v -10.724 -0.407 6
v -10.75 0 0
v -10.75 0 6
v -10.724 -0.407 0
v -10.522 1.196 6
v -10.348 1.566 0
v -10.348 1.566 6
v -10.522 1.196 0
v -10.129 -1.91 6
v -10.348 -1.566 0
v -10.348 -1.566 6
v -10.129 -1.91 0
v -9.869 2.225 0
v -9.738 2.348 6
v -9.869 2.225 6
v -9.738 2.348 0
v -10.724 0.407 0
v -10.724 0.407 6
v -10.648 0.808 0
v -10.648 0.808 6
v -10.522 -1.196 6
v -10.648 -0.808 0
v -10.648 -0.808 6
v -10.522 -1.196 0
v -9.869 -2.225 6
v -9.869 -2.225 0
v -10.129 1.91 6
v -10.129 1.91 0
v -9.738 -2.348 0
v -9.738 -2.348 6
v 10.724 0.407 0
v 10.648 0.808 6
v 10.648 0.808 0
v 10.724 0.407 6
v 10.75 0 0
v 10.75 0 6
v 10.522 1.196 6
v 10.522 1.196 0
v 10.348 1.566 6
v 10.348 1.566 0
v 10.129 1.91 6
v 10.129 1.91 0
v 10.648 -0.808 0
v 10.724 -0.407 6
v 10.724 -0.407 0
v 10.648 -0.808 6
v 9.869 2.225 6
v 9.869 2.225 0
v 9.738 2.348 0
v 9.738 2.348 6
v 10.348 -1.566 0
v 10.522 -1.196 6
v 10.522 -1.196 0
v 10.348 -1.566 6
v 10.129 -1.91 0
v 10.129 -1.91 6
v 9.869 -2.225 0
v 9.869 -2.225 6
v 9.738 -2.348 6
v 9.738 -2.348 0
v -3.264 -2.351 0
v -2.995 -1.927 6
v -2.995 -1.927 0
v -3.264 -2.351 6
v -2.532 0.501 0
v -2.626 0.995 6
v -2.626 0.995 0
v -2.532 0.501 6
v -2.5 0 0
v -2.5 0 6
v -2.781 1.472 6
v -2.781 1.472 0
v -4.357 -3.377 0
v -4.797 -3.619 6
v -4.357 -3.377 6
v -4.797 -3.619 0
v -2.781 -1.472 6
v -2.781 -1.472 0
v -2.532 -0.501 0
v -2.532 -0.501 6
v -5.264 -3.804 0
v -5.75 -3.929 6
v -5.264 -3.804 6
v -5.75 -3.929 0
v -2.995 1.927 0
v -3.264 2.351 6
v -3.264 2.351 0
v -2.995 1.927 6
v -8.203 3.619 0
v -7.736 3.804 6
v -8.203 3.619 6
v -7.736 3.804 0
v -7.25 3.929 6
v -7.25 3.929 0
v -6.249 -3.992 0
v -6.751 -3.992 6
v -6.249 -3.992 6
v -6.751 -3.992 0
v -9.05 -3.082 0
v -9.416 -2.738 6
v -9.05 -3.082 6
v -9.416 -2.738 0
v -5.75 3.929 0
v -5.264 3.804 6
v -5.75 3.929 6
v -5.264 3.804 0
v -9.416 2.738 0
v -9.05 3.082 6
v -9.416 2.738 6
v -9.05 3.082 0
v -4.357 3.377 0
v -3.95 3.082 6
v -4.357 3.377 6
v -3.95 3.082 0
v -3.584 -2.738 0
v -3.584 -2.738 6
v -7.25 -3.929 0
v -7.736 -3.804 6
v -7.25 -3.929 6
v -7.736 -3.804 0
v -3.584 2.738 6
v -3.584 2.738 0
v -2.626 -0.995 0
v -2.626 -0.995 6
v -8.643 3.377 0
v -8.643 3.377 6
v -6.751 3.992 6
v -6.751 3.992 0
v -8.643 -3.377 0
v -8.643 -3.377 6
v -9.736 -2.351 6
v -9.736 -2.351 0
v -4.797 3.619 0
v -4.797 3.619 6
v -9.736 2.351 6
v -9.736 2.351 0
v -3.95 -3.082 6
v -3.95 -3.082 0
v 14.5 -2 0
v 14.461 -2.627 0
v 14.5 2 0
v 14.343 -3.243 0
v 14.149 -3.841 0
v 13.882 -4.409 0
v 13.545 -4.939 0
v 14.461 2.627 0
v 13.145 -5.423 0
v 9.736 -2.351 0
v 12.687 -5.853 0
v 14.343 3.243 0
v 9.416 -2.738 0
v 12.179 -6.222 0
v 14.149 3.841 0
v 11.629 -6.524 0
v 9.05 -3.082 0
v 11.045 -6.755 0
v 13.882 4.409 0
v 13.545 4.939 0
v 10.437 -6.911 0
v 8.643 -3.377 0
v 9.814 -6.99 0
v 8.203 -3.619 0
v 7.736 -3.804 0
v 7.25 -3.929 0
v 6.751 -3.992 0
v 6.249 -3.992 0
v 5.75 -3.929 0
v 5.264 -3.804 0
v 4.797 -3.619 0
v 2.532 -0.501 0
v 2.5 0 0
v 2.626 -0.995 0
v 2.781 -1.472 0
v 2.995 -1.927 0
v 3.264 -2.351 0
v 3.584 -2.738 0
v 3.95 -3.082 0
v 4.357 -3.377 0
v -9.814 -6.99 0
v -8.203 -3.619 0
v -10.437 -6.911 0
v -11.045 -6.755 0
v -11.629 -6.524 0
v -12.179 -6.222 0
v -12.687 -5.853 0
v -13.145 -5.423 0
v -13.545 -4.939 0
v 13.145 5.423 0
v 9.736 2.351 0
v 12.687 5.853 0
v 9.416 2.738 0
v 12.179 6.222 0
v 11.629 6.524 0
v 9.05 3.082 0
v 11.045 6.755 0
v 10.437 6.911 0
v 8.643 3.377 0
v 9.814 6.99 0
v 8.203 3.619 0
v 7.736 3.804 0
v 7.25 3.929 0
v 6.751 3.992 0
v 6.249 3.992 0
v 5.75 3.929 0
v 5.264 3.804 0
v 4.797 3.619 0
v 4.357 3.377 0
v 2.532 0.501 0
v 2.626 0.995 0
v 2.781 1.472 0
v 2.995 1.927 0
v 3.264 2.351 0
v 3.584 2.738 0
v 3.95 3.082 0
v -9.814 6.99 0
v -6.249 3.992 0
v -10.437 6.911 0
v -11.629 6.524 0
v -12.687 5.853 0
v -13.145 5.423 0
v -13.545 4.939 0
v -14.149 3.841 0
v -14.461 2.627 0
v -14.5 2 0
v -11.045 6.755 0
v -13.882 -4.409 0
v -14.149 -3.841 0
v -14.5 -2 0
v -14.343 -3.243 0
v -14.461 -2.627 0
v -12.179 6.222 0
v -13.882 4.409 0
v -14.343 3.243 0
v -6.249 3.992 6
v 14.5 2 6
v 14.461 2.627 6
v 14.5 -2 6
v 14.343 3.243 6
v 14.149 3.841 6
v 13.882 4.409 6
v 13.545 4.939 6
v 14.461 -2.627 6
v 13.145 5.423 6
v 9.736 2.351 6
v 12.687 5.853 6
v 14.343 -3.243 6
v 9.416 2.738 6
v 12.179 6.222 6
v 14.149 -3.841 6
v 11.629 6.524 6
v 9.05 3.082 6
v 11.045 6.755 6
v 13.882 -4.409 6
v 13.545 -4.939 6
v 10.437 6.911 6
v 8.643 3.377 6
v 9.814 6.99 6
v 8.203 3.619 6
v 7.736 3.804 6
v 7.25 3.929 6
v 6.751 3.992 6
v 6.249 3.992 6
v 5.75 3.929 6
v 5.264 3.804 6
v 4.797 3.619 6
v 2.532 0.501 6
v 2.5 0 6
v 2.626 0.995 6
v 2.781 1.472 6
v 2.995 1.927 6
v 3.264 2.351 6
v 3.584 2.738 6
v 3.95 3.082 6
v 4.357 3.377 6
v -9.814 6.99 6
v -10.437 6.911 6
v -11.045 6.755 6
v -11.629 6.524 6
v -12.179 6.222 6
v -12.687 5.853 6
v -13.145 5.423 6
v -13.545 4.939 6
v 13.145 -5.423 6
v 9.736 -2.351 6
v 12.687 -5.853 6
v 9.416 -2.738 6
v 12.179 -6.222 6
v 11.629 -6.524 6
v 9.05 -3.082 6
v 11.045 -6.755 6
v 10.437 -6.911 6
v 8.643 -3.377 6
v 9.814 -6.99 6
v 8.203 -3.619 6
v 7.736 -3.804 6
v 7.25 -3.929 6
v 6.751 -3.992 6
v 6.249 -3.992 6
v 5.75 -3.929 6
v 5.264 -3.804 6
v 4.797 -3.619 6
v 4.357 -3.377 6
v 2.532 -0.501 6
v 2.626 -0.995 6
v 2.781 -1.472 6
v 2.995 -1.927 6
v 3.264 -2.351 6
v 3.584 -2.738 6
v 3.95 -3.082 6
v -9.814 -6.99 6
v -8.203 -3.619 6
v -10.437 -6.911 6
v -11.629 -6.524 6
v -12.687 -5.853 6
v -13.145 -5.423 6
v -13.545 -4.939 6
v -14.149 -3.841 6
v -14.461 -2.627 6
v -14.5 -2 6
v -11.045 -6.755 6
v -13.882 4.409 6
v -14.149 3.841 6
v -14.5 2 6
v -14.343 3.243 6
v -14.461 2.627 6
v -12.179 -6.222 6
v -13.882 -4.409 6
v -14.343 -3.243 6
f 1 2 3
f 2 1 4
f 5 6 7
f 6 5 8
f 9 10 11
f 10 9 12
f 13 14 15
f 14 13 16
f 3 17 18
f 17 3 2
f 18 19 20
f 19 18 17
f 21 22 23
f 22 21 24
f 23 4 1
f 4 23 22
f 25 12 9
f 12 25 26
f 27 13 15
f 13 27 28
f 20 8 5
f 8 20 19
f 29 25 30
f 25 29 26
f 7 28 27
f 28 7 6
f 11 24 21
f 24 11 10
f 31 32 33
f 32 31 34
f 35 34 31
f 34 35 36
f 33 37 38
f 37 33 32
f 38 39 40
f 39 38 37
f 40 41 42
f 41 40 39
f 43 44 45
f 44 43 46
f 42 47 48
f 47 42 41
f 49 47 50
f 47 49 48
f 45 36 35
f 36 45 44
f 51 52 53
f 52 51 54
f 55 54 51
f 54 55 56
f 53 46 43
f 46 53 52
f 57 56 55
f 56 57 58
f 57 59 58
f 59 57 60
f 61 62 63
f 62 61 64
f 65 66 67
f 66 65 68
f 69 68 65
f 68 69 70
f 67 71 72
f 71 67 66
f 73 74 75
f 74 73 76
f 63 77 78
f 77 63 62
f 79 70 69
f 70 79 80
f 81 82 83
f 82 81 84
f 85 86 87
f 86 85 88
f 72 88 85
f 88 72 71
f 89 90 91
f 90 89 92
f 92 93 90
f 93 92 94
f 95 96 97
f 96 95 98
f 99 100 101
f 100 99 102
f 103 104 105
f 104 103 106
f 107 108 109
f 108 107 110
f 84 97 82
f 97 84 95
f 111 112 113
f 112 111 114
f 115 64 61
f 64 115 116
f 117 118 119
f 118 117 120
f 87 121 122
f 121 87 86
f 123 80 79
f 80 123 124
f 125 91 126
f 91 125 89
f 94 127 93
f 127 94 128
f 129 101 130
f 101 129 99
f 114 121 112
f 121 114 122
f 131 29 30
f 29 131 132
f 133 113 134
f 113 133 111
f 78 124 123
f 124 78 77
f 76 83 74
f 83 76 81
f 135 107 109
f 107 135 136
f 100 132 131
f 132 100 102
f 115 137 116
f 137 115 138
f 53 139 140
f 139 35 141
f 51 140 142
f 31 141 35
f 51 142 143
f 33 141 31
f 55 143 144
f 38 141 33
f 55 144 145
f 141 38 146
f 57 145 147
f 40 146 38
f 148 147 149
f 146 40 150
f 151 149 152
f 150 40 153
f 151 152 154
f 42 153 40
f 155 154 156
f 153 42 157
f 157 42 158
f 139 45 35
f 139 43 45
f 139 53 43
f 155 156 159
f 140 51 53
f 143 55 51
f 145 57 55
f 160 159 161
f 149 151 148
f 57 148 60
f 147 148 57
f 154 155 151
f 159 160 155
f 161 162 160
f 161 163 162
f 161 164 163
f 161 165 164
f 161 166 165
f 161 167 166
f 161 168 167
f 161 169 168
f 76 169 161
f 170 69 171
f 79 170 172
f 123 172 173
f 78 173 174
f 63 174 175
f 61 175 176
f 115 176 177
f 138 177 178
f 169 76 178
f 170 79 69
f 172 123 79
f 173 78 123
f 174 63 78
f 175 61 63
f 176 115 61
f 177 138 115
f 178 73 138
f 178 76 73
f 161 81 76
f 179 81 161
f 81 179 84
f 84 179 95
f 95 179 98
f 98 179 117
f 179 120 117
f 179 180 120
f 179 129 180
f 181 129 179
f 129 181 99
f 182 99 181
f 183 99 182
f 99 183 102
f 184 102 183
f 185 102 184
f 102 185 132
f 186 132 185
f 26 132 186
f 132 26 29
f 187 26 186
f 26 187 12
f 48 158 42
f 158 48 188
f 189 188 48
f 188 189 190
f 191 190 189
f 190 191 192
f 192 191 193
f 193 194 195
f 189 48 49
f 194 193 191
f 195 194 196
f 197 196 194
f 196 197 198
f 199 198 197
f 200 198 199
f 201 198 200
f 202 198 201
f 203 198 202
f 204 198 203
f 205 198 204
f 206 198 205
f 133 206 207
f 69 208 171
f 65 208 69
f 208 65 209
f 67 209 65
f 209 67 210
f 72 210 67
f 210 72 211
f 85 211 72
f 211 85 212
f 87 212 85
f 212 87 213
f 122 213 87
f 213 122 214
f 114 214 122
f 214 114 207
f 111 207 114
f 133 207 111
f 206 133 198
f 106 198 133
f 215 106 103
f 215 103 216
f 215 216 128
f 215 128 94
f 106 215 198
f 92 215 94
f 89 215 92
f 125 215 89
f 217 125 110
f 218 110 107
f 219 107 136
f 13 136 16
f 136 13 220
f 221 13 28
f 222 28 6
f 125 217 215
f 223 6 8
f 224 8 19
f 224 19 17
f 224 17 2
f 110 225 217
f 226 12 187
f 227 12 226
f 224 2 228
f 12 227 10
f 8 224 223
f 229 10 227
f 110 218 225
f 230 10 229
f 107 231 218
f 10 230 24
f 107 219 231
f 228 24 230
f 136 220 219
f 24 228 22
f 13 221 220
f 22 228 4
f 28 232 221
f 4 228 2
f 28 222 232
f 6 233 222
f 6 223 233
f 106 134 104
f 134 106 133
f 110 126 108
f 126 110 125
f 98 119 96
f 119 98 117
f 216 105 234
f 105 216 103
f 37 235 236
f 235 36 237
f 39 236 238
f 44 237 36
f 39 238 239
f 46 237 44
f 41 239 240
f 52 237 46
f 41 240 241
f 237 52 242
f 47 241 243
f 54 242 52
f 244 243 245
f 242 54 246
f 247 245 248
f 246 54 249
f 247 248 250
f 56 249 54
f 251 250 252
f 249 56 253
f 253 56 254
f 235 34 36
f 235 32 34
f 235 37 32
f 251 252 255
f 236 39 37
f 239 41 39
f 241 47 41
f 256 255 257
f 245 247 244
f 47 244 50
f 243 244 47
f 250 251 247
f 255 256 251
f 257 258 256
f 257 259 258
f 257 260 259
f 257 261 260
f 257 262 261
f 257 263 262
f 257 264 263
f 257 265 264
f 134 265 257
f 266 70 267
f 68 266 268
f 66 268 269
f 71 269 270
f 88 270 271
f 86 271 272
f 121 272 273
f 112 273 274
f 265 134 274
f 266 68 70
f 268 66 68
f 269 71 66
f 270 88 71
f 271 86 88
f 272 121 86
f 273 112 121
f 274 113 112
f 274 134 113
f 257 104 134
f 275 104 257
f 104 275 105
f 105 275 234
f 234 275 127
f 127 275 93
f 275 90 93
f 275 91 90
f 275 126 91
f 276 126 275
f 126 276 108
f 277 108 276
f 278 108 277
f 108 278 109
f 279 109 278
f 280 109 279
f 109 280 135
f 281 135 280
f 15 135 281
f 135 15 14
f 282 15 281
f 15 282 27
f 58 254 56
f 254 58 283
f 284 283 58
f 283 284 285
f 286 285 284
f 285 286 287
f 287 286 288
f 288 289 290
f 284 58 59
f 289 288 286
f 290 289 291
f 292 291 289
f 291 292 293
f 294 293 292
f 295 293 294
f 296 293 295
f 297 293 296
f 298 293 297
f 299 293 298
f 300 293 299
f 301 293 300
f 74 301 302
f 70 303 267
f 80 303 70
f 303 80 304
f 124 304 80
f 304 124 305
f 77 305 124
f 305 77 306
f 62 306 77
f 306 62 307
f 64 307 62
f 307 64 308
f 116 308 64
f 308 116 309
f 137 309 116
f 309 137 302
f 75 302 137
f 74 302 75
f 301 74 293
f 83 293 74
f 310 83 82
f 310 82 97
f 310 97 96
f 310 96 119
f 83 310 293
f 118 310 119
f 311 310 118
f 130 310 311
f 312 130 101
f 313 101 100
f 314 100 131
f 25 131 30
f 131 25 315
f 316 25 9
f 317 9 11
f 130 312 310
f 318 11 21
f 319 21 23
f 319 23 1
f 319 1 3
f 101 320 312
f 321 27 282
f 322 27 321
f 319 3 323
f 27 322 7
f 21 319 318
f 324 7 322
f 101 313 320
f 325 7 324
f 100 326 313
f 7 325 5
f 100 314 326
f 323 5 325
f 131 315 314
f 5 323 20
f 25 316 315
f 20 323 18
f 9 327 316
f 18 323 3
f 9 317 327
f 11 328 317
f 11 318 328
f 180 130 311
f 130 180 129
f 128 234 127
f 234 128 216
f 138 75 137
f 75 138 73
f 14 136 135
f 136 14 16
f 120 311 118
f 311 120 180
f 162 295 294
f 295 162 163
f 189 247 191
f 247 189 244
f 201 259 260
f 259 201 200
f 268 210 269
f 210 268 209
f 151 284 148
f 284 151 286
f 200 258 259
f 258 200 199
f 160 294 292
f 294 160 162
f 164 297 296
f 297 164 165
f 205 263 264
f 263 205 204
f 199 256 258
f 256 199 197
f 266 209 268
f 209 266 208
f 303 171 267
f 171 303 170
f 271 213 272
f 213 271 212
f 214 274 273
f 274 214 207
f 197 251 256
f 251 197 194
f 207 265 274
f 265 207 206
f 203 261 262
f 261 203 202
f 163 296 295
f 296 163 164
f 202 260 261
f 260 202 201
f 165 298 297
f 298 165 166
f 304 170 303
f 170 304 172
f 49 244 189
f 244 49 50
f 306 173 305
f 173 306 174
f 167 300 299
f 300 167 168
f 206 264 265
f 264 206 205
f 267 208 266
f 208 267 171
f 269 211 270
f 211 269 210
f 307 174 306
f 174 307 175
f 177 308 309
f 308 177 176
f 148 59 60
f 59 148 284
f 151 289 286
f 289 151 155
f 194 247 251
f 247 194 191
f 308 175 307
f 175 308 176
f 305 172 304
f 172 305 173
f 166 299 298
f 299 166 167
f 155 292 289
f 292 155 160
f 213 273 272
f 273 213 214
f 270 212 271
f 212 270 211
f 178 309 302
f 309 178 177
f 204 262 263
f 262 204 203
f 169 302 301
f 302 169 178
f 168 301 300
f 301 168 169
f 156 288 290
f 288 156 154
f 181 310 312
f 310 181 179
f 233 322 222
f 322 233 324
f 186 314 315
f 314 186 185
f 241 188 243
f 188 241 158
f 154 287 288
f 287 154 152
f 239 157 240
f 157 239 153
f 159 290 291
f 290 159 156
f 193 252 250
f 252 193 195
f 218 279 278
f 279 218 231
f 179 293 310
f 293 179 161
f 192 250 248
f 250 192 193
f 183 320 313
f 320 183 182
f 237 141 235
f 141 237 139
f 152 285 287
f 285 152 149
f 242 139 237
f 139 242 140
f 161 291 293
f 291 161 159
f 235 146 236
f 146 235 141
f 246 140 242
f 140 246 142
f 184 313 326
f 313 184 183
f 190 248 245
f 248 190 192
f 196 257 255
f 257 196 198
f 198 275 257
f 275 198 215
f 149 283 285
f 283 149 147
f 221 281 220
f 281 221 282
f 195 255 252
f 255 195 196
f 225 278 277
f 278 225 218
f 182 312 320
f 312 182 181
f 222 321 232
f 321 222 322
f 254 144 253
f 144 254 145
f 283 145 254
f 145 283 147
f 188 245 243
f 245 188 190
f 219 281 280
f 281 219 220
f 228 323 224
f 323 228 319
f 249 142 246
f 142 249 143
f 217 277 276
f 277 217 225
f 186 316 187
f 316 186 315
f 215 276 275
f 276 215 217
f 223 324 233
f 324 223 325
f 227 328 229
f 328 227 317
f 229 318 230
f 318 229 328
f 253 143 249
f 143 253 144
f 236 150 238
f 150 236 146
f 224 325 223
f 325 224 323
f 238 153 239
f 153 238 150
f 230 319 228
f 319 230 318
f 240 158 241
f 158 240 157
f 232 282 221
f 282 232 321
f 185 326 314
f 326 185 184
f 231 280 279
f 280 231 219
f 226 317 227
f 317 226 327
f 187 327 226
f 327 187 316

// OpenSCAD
$fn = 50;


difference() {
	union() {
		hull() {
			translate(v = [-9.5000000000, 2.0000000000, 0]) {
				cylinder(h = 6, r = 5);
			}
			translate(v = [9.5000000000, 2.0000000000, 0]) {
				cylinder(h = 6, r = 5);
			}
			translate(v = [-9.5000000000, -2.0000000000, 0]) {
				cylinder(h = 6, r = 5);
			}
			translate(v = [9.5000000000, -2.0000000000, 0]) {
				cylinder(h = 6, r = 5);
			}
		}
	}
	union() {
		#translate(v = [-7.5000000000, 0.0000000000, -100.0000000000]) {
			cylinder(h = 200, r = 3.2500000000);
		}
		#translate(v = [-7.5000000000, 0.0000000000, -100.0000000000]) {
			cylinder(h = 200, r = 3.2500000000);
		}
		#translate(v = [7.5000000000, 0.0000000000, -100.0000000000]) {
			cylinder(h = 200, r = 3.2500000000);
		}
		#translate(v = [7.5000000000, 0.0000000000, -100.0000000000]) {
			cylinder(h = 200, r = 3.2500000000);
		}
		#translate(v = [-6.5000000000, 0, 0]) {
			cylinder(h = 6, r = 4.0000000000);
		}
		#translate(v = [6.5000000000, 0, 0]) {
			cylinder(h = 6, r = 4.0000000000);
		}
	}
}
